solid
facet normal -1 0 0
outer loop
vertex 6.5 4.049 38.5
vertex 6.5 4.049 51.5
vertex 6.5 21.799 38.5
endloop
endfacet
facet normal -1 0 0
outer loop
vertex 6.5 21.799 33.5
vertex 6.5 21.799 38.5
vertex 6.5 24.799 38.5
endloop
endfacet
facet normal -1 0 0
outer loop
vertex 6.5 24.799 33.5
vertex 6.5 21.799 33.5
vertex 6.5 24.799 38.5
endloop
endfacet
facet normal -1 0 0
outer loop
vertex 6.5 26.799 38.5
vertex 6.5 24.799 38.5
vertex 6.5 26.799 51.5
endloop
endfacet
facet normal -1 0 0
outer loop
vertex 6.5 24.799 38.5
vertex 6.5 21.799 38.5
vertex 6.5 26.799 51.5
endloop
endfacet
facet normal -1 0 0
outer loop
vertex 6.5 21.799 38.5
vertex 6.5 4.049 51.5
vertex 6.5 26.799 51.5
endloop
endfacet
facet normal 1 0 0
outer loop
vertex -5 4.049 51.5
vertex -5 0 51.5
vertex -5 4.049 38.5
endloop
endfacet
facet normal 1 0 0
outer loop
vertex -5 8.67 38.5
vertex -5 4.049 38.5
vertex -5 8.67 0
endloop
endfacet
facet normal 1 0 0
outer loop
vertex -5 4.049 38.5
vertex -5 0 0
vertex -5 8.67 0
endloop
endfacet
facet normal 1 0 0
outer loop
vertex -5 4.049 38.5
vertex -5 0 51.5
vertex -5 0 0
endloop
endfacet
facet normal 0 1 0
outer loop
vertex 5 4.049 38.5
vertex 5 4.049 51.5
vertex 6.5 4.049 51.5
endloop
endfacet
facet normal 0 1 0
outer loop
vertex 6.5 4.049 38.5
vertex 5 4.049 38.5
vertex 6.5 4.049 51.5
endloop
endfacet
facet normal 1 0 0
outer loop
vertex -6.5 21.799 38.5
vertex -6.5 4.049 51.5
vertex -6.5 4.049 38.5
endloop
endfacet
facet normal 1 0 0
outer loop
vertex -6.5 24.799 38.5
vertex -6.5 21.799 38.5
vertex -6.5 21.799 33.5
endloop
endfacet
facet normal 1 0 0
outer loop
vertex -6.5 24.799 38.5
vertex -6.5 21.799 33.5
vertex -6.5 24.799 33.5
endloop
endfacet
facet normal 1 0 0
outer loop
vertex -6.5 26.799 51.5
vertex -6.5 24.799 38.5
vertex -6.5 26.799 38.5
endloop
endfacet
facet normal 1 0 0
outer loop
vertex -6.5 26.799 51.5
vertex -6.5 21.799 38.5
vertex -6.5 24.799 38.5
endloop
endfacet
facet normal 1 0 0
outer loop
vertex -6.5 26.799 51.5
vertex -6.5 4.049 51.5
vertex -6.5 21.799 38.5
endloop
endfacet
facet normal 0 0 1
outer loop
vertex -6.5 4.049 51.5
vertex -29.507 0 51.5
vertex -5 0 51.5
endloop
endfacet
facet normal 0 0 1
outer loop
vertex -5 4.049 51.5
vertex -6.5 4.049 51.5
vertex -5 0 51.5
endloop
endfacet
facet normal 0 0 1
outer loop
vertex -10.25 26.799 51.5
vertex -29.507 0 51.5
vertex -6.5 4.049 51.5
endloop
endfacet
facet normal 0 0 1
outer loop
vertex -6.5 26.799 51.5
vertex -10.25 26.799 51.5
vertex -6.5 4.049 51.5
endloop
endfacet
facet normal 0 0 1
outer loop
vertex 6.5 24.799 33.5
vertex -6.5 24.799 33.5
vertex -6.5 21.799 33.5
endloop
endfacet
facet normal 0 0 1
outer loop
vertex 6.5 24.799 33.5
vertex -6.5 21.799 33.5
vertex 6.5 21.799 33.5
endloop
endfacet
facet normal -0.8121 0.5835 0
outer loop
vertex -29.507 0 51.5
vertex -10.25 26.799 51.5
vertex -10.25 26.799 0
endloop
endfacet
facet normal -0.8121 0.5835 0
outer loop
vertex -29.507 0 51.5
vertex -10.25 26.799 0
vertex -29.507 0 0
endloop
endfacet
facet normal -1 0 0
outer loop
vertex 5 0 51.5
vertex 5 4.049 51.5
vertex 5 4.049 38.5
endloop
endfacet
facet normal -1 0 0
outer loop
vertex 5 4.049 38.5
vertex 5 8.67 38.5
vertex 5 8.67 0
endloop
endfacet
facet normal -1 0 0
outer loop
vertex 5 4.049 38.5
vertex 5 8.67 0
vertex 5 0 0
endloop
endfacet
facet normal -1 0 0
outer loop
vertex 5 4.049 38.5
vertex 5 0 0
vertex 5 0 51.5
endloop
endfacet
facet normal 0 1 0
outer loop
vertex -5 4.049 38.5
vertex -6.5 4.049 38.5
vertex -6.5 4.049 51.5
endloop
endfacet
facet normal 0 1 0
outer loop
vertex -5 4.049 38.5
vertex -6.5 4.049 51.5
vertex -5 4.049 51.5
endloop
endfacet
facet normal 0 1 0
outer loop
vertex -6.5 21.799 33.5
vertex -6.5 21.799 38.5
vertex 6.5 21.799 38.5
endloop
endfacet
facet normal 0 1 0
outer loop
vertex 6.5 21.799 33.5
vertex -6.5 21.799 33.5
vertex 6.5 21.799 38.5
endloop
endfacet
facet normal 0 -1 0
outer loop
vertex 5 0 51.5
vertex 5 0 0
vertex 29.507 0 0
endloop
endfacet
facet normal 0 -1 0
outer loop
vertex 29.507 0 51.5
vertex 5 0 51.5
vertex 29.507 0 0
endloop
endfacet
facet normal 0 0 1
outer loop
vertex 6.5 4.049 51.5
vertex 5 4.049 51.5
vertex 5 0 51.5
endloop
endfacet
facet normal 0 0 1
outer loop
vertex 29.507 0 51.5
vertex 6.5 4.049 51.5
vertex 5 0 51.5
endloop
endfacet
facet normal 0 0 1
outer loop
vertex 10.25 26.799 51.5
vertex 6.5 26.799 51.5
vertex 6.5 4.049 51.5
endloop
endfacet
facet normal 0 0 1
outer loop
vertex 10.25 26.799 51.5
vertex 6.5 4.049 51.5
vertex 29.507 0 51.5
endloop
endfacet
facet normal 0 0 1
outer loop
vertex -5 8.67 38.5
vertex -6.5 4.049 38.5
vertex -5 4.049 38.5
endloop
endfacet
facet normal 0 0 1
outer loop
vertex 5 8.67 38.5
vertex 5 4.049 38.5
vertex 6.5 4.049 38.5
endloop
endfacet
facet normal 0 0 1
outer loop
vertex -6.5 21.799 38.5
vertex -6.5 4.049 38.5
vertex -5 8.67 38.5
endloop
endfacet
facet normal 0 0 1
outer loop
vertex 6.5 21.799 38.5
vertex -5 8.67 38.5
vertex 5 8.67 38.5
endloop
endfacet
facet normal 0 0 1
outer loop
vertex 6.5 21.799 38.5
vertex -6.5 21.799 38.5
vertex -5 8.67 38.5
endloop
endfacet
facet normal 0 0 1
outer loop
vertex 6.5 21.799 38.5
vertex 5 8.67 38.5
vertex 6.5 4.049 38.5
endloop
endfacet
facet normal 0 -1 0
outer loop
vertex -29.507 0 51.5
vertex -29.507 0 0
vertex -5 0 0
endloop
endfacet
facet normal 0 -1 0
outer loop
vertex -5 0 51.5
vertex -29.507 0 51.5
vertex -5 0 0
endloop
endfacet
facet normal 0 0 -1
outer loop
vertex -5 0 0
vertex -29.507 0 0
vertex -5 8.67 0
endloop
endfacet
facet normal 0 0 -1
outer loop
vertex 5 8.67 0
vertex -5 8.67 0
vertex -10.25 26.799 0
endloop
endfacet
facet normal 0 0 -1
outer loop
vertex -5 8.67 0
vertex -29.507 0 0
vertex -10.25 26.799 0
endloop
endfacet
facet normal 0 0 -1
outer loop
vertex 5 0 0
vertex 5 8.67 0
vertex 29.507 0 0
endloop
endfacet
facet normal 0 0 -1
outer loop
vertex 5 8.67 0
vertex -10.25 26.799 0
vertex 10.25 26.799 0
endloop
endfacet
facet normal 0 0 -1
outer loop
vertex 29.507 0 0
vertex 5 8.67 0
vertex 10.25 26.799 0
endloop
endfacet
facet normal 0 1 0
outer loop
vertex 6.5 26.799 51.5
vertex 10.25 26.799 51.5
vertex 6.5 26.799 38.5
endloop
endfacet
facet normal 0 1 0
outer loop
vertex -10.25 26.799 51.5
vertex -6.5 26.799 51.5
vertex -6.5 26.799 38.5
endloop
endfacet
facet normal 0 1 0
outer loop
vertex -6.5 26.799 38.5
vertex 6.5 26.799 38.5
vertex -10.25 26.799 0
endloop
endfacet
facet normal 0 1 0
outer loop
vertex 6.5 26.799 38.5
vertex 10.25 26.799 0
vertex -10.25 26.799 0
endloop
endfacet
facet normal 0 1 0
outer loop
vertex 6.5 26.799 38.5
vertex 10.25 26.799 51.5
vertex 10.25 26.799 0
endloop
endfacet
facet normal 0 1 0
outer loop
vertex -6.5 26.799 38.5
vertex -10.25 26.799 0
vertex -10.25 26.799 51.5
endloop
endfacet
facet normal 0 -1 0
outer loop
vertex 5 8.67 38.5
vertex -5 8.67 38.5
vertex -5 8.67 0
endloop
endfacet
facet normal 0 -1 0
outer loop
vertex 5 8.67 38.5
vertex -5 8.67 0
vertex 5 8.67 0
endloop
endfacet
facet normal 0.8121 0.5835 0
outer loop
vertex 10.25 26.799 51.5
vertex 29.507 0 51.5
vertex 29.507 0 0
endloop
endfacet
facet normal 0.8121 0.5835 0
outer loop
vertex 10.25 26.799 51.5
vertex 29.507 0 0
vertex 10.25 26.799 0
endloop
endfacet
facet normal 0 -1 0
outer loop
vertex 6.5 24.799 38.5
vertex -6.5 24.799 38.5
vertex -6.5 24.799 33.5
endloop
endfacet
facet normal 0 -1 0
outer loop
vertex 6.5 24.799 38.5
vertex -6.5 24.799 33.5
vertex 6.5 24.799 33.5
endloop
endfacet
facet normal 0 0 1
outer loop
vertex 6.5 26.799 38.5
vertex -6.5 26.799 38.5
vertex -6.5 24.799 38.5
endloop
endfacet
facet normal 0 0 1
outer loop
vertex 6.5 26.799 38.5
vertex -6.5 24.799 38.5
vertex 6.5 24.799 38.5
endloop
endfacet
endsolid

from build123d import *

# Parameters (mm, degrees)
F1_DEPTH = 51.5
F2_W     = 13
F2_H     = 22.75
F3_DEPTH = 13
F4_W     = 13
F4_H     = 3
F5_DEPTH = 5


with BuildPart() as f1:
    # F0 (on Top) → F1 (new body)
    with BuildSketch(Plane.XY):
        Polygon((-10.25, 26.798756), (-29.50686, 0), (-5, 0), (-5, 8.67), (5, 8.67), (5, 0), (29.50686, 0), (10.25, 26.798756), align=None)
    extrude(amount=F1_DEPTH)

    # F2 (on face) → F3 (cut)
    with BuildSketch(Plane.XY.offset(51.5)):
        with Locations((0, 15.423756)):
            Rectangle(F2_W, F2_H)
    extrude(amount=-F3_DEPTH, mode=Mode.SUBTRACT)

    # F4 (on face) → F5 (cut)
    with BuildSketch(Plane.XY.offset(38.5)):
        with Locations((0, 23.298756)):
            Rectangle(F4_W, F4_H)
    extrude(amount=-F5_DEPTH, mode=Mode.SUBTRACT)


solid = f1.part
